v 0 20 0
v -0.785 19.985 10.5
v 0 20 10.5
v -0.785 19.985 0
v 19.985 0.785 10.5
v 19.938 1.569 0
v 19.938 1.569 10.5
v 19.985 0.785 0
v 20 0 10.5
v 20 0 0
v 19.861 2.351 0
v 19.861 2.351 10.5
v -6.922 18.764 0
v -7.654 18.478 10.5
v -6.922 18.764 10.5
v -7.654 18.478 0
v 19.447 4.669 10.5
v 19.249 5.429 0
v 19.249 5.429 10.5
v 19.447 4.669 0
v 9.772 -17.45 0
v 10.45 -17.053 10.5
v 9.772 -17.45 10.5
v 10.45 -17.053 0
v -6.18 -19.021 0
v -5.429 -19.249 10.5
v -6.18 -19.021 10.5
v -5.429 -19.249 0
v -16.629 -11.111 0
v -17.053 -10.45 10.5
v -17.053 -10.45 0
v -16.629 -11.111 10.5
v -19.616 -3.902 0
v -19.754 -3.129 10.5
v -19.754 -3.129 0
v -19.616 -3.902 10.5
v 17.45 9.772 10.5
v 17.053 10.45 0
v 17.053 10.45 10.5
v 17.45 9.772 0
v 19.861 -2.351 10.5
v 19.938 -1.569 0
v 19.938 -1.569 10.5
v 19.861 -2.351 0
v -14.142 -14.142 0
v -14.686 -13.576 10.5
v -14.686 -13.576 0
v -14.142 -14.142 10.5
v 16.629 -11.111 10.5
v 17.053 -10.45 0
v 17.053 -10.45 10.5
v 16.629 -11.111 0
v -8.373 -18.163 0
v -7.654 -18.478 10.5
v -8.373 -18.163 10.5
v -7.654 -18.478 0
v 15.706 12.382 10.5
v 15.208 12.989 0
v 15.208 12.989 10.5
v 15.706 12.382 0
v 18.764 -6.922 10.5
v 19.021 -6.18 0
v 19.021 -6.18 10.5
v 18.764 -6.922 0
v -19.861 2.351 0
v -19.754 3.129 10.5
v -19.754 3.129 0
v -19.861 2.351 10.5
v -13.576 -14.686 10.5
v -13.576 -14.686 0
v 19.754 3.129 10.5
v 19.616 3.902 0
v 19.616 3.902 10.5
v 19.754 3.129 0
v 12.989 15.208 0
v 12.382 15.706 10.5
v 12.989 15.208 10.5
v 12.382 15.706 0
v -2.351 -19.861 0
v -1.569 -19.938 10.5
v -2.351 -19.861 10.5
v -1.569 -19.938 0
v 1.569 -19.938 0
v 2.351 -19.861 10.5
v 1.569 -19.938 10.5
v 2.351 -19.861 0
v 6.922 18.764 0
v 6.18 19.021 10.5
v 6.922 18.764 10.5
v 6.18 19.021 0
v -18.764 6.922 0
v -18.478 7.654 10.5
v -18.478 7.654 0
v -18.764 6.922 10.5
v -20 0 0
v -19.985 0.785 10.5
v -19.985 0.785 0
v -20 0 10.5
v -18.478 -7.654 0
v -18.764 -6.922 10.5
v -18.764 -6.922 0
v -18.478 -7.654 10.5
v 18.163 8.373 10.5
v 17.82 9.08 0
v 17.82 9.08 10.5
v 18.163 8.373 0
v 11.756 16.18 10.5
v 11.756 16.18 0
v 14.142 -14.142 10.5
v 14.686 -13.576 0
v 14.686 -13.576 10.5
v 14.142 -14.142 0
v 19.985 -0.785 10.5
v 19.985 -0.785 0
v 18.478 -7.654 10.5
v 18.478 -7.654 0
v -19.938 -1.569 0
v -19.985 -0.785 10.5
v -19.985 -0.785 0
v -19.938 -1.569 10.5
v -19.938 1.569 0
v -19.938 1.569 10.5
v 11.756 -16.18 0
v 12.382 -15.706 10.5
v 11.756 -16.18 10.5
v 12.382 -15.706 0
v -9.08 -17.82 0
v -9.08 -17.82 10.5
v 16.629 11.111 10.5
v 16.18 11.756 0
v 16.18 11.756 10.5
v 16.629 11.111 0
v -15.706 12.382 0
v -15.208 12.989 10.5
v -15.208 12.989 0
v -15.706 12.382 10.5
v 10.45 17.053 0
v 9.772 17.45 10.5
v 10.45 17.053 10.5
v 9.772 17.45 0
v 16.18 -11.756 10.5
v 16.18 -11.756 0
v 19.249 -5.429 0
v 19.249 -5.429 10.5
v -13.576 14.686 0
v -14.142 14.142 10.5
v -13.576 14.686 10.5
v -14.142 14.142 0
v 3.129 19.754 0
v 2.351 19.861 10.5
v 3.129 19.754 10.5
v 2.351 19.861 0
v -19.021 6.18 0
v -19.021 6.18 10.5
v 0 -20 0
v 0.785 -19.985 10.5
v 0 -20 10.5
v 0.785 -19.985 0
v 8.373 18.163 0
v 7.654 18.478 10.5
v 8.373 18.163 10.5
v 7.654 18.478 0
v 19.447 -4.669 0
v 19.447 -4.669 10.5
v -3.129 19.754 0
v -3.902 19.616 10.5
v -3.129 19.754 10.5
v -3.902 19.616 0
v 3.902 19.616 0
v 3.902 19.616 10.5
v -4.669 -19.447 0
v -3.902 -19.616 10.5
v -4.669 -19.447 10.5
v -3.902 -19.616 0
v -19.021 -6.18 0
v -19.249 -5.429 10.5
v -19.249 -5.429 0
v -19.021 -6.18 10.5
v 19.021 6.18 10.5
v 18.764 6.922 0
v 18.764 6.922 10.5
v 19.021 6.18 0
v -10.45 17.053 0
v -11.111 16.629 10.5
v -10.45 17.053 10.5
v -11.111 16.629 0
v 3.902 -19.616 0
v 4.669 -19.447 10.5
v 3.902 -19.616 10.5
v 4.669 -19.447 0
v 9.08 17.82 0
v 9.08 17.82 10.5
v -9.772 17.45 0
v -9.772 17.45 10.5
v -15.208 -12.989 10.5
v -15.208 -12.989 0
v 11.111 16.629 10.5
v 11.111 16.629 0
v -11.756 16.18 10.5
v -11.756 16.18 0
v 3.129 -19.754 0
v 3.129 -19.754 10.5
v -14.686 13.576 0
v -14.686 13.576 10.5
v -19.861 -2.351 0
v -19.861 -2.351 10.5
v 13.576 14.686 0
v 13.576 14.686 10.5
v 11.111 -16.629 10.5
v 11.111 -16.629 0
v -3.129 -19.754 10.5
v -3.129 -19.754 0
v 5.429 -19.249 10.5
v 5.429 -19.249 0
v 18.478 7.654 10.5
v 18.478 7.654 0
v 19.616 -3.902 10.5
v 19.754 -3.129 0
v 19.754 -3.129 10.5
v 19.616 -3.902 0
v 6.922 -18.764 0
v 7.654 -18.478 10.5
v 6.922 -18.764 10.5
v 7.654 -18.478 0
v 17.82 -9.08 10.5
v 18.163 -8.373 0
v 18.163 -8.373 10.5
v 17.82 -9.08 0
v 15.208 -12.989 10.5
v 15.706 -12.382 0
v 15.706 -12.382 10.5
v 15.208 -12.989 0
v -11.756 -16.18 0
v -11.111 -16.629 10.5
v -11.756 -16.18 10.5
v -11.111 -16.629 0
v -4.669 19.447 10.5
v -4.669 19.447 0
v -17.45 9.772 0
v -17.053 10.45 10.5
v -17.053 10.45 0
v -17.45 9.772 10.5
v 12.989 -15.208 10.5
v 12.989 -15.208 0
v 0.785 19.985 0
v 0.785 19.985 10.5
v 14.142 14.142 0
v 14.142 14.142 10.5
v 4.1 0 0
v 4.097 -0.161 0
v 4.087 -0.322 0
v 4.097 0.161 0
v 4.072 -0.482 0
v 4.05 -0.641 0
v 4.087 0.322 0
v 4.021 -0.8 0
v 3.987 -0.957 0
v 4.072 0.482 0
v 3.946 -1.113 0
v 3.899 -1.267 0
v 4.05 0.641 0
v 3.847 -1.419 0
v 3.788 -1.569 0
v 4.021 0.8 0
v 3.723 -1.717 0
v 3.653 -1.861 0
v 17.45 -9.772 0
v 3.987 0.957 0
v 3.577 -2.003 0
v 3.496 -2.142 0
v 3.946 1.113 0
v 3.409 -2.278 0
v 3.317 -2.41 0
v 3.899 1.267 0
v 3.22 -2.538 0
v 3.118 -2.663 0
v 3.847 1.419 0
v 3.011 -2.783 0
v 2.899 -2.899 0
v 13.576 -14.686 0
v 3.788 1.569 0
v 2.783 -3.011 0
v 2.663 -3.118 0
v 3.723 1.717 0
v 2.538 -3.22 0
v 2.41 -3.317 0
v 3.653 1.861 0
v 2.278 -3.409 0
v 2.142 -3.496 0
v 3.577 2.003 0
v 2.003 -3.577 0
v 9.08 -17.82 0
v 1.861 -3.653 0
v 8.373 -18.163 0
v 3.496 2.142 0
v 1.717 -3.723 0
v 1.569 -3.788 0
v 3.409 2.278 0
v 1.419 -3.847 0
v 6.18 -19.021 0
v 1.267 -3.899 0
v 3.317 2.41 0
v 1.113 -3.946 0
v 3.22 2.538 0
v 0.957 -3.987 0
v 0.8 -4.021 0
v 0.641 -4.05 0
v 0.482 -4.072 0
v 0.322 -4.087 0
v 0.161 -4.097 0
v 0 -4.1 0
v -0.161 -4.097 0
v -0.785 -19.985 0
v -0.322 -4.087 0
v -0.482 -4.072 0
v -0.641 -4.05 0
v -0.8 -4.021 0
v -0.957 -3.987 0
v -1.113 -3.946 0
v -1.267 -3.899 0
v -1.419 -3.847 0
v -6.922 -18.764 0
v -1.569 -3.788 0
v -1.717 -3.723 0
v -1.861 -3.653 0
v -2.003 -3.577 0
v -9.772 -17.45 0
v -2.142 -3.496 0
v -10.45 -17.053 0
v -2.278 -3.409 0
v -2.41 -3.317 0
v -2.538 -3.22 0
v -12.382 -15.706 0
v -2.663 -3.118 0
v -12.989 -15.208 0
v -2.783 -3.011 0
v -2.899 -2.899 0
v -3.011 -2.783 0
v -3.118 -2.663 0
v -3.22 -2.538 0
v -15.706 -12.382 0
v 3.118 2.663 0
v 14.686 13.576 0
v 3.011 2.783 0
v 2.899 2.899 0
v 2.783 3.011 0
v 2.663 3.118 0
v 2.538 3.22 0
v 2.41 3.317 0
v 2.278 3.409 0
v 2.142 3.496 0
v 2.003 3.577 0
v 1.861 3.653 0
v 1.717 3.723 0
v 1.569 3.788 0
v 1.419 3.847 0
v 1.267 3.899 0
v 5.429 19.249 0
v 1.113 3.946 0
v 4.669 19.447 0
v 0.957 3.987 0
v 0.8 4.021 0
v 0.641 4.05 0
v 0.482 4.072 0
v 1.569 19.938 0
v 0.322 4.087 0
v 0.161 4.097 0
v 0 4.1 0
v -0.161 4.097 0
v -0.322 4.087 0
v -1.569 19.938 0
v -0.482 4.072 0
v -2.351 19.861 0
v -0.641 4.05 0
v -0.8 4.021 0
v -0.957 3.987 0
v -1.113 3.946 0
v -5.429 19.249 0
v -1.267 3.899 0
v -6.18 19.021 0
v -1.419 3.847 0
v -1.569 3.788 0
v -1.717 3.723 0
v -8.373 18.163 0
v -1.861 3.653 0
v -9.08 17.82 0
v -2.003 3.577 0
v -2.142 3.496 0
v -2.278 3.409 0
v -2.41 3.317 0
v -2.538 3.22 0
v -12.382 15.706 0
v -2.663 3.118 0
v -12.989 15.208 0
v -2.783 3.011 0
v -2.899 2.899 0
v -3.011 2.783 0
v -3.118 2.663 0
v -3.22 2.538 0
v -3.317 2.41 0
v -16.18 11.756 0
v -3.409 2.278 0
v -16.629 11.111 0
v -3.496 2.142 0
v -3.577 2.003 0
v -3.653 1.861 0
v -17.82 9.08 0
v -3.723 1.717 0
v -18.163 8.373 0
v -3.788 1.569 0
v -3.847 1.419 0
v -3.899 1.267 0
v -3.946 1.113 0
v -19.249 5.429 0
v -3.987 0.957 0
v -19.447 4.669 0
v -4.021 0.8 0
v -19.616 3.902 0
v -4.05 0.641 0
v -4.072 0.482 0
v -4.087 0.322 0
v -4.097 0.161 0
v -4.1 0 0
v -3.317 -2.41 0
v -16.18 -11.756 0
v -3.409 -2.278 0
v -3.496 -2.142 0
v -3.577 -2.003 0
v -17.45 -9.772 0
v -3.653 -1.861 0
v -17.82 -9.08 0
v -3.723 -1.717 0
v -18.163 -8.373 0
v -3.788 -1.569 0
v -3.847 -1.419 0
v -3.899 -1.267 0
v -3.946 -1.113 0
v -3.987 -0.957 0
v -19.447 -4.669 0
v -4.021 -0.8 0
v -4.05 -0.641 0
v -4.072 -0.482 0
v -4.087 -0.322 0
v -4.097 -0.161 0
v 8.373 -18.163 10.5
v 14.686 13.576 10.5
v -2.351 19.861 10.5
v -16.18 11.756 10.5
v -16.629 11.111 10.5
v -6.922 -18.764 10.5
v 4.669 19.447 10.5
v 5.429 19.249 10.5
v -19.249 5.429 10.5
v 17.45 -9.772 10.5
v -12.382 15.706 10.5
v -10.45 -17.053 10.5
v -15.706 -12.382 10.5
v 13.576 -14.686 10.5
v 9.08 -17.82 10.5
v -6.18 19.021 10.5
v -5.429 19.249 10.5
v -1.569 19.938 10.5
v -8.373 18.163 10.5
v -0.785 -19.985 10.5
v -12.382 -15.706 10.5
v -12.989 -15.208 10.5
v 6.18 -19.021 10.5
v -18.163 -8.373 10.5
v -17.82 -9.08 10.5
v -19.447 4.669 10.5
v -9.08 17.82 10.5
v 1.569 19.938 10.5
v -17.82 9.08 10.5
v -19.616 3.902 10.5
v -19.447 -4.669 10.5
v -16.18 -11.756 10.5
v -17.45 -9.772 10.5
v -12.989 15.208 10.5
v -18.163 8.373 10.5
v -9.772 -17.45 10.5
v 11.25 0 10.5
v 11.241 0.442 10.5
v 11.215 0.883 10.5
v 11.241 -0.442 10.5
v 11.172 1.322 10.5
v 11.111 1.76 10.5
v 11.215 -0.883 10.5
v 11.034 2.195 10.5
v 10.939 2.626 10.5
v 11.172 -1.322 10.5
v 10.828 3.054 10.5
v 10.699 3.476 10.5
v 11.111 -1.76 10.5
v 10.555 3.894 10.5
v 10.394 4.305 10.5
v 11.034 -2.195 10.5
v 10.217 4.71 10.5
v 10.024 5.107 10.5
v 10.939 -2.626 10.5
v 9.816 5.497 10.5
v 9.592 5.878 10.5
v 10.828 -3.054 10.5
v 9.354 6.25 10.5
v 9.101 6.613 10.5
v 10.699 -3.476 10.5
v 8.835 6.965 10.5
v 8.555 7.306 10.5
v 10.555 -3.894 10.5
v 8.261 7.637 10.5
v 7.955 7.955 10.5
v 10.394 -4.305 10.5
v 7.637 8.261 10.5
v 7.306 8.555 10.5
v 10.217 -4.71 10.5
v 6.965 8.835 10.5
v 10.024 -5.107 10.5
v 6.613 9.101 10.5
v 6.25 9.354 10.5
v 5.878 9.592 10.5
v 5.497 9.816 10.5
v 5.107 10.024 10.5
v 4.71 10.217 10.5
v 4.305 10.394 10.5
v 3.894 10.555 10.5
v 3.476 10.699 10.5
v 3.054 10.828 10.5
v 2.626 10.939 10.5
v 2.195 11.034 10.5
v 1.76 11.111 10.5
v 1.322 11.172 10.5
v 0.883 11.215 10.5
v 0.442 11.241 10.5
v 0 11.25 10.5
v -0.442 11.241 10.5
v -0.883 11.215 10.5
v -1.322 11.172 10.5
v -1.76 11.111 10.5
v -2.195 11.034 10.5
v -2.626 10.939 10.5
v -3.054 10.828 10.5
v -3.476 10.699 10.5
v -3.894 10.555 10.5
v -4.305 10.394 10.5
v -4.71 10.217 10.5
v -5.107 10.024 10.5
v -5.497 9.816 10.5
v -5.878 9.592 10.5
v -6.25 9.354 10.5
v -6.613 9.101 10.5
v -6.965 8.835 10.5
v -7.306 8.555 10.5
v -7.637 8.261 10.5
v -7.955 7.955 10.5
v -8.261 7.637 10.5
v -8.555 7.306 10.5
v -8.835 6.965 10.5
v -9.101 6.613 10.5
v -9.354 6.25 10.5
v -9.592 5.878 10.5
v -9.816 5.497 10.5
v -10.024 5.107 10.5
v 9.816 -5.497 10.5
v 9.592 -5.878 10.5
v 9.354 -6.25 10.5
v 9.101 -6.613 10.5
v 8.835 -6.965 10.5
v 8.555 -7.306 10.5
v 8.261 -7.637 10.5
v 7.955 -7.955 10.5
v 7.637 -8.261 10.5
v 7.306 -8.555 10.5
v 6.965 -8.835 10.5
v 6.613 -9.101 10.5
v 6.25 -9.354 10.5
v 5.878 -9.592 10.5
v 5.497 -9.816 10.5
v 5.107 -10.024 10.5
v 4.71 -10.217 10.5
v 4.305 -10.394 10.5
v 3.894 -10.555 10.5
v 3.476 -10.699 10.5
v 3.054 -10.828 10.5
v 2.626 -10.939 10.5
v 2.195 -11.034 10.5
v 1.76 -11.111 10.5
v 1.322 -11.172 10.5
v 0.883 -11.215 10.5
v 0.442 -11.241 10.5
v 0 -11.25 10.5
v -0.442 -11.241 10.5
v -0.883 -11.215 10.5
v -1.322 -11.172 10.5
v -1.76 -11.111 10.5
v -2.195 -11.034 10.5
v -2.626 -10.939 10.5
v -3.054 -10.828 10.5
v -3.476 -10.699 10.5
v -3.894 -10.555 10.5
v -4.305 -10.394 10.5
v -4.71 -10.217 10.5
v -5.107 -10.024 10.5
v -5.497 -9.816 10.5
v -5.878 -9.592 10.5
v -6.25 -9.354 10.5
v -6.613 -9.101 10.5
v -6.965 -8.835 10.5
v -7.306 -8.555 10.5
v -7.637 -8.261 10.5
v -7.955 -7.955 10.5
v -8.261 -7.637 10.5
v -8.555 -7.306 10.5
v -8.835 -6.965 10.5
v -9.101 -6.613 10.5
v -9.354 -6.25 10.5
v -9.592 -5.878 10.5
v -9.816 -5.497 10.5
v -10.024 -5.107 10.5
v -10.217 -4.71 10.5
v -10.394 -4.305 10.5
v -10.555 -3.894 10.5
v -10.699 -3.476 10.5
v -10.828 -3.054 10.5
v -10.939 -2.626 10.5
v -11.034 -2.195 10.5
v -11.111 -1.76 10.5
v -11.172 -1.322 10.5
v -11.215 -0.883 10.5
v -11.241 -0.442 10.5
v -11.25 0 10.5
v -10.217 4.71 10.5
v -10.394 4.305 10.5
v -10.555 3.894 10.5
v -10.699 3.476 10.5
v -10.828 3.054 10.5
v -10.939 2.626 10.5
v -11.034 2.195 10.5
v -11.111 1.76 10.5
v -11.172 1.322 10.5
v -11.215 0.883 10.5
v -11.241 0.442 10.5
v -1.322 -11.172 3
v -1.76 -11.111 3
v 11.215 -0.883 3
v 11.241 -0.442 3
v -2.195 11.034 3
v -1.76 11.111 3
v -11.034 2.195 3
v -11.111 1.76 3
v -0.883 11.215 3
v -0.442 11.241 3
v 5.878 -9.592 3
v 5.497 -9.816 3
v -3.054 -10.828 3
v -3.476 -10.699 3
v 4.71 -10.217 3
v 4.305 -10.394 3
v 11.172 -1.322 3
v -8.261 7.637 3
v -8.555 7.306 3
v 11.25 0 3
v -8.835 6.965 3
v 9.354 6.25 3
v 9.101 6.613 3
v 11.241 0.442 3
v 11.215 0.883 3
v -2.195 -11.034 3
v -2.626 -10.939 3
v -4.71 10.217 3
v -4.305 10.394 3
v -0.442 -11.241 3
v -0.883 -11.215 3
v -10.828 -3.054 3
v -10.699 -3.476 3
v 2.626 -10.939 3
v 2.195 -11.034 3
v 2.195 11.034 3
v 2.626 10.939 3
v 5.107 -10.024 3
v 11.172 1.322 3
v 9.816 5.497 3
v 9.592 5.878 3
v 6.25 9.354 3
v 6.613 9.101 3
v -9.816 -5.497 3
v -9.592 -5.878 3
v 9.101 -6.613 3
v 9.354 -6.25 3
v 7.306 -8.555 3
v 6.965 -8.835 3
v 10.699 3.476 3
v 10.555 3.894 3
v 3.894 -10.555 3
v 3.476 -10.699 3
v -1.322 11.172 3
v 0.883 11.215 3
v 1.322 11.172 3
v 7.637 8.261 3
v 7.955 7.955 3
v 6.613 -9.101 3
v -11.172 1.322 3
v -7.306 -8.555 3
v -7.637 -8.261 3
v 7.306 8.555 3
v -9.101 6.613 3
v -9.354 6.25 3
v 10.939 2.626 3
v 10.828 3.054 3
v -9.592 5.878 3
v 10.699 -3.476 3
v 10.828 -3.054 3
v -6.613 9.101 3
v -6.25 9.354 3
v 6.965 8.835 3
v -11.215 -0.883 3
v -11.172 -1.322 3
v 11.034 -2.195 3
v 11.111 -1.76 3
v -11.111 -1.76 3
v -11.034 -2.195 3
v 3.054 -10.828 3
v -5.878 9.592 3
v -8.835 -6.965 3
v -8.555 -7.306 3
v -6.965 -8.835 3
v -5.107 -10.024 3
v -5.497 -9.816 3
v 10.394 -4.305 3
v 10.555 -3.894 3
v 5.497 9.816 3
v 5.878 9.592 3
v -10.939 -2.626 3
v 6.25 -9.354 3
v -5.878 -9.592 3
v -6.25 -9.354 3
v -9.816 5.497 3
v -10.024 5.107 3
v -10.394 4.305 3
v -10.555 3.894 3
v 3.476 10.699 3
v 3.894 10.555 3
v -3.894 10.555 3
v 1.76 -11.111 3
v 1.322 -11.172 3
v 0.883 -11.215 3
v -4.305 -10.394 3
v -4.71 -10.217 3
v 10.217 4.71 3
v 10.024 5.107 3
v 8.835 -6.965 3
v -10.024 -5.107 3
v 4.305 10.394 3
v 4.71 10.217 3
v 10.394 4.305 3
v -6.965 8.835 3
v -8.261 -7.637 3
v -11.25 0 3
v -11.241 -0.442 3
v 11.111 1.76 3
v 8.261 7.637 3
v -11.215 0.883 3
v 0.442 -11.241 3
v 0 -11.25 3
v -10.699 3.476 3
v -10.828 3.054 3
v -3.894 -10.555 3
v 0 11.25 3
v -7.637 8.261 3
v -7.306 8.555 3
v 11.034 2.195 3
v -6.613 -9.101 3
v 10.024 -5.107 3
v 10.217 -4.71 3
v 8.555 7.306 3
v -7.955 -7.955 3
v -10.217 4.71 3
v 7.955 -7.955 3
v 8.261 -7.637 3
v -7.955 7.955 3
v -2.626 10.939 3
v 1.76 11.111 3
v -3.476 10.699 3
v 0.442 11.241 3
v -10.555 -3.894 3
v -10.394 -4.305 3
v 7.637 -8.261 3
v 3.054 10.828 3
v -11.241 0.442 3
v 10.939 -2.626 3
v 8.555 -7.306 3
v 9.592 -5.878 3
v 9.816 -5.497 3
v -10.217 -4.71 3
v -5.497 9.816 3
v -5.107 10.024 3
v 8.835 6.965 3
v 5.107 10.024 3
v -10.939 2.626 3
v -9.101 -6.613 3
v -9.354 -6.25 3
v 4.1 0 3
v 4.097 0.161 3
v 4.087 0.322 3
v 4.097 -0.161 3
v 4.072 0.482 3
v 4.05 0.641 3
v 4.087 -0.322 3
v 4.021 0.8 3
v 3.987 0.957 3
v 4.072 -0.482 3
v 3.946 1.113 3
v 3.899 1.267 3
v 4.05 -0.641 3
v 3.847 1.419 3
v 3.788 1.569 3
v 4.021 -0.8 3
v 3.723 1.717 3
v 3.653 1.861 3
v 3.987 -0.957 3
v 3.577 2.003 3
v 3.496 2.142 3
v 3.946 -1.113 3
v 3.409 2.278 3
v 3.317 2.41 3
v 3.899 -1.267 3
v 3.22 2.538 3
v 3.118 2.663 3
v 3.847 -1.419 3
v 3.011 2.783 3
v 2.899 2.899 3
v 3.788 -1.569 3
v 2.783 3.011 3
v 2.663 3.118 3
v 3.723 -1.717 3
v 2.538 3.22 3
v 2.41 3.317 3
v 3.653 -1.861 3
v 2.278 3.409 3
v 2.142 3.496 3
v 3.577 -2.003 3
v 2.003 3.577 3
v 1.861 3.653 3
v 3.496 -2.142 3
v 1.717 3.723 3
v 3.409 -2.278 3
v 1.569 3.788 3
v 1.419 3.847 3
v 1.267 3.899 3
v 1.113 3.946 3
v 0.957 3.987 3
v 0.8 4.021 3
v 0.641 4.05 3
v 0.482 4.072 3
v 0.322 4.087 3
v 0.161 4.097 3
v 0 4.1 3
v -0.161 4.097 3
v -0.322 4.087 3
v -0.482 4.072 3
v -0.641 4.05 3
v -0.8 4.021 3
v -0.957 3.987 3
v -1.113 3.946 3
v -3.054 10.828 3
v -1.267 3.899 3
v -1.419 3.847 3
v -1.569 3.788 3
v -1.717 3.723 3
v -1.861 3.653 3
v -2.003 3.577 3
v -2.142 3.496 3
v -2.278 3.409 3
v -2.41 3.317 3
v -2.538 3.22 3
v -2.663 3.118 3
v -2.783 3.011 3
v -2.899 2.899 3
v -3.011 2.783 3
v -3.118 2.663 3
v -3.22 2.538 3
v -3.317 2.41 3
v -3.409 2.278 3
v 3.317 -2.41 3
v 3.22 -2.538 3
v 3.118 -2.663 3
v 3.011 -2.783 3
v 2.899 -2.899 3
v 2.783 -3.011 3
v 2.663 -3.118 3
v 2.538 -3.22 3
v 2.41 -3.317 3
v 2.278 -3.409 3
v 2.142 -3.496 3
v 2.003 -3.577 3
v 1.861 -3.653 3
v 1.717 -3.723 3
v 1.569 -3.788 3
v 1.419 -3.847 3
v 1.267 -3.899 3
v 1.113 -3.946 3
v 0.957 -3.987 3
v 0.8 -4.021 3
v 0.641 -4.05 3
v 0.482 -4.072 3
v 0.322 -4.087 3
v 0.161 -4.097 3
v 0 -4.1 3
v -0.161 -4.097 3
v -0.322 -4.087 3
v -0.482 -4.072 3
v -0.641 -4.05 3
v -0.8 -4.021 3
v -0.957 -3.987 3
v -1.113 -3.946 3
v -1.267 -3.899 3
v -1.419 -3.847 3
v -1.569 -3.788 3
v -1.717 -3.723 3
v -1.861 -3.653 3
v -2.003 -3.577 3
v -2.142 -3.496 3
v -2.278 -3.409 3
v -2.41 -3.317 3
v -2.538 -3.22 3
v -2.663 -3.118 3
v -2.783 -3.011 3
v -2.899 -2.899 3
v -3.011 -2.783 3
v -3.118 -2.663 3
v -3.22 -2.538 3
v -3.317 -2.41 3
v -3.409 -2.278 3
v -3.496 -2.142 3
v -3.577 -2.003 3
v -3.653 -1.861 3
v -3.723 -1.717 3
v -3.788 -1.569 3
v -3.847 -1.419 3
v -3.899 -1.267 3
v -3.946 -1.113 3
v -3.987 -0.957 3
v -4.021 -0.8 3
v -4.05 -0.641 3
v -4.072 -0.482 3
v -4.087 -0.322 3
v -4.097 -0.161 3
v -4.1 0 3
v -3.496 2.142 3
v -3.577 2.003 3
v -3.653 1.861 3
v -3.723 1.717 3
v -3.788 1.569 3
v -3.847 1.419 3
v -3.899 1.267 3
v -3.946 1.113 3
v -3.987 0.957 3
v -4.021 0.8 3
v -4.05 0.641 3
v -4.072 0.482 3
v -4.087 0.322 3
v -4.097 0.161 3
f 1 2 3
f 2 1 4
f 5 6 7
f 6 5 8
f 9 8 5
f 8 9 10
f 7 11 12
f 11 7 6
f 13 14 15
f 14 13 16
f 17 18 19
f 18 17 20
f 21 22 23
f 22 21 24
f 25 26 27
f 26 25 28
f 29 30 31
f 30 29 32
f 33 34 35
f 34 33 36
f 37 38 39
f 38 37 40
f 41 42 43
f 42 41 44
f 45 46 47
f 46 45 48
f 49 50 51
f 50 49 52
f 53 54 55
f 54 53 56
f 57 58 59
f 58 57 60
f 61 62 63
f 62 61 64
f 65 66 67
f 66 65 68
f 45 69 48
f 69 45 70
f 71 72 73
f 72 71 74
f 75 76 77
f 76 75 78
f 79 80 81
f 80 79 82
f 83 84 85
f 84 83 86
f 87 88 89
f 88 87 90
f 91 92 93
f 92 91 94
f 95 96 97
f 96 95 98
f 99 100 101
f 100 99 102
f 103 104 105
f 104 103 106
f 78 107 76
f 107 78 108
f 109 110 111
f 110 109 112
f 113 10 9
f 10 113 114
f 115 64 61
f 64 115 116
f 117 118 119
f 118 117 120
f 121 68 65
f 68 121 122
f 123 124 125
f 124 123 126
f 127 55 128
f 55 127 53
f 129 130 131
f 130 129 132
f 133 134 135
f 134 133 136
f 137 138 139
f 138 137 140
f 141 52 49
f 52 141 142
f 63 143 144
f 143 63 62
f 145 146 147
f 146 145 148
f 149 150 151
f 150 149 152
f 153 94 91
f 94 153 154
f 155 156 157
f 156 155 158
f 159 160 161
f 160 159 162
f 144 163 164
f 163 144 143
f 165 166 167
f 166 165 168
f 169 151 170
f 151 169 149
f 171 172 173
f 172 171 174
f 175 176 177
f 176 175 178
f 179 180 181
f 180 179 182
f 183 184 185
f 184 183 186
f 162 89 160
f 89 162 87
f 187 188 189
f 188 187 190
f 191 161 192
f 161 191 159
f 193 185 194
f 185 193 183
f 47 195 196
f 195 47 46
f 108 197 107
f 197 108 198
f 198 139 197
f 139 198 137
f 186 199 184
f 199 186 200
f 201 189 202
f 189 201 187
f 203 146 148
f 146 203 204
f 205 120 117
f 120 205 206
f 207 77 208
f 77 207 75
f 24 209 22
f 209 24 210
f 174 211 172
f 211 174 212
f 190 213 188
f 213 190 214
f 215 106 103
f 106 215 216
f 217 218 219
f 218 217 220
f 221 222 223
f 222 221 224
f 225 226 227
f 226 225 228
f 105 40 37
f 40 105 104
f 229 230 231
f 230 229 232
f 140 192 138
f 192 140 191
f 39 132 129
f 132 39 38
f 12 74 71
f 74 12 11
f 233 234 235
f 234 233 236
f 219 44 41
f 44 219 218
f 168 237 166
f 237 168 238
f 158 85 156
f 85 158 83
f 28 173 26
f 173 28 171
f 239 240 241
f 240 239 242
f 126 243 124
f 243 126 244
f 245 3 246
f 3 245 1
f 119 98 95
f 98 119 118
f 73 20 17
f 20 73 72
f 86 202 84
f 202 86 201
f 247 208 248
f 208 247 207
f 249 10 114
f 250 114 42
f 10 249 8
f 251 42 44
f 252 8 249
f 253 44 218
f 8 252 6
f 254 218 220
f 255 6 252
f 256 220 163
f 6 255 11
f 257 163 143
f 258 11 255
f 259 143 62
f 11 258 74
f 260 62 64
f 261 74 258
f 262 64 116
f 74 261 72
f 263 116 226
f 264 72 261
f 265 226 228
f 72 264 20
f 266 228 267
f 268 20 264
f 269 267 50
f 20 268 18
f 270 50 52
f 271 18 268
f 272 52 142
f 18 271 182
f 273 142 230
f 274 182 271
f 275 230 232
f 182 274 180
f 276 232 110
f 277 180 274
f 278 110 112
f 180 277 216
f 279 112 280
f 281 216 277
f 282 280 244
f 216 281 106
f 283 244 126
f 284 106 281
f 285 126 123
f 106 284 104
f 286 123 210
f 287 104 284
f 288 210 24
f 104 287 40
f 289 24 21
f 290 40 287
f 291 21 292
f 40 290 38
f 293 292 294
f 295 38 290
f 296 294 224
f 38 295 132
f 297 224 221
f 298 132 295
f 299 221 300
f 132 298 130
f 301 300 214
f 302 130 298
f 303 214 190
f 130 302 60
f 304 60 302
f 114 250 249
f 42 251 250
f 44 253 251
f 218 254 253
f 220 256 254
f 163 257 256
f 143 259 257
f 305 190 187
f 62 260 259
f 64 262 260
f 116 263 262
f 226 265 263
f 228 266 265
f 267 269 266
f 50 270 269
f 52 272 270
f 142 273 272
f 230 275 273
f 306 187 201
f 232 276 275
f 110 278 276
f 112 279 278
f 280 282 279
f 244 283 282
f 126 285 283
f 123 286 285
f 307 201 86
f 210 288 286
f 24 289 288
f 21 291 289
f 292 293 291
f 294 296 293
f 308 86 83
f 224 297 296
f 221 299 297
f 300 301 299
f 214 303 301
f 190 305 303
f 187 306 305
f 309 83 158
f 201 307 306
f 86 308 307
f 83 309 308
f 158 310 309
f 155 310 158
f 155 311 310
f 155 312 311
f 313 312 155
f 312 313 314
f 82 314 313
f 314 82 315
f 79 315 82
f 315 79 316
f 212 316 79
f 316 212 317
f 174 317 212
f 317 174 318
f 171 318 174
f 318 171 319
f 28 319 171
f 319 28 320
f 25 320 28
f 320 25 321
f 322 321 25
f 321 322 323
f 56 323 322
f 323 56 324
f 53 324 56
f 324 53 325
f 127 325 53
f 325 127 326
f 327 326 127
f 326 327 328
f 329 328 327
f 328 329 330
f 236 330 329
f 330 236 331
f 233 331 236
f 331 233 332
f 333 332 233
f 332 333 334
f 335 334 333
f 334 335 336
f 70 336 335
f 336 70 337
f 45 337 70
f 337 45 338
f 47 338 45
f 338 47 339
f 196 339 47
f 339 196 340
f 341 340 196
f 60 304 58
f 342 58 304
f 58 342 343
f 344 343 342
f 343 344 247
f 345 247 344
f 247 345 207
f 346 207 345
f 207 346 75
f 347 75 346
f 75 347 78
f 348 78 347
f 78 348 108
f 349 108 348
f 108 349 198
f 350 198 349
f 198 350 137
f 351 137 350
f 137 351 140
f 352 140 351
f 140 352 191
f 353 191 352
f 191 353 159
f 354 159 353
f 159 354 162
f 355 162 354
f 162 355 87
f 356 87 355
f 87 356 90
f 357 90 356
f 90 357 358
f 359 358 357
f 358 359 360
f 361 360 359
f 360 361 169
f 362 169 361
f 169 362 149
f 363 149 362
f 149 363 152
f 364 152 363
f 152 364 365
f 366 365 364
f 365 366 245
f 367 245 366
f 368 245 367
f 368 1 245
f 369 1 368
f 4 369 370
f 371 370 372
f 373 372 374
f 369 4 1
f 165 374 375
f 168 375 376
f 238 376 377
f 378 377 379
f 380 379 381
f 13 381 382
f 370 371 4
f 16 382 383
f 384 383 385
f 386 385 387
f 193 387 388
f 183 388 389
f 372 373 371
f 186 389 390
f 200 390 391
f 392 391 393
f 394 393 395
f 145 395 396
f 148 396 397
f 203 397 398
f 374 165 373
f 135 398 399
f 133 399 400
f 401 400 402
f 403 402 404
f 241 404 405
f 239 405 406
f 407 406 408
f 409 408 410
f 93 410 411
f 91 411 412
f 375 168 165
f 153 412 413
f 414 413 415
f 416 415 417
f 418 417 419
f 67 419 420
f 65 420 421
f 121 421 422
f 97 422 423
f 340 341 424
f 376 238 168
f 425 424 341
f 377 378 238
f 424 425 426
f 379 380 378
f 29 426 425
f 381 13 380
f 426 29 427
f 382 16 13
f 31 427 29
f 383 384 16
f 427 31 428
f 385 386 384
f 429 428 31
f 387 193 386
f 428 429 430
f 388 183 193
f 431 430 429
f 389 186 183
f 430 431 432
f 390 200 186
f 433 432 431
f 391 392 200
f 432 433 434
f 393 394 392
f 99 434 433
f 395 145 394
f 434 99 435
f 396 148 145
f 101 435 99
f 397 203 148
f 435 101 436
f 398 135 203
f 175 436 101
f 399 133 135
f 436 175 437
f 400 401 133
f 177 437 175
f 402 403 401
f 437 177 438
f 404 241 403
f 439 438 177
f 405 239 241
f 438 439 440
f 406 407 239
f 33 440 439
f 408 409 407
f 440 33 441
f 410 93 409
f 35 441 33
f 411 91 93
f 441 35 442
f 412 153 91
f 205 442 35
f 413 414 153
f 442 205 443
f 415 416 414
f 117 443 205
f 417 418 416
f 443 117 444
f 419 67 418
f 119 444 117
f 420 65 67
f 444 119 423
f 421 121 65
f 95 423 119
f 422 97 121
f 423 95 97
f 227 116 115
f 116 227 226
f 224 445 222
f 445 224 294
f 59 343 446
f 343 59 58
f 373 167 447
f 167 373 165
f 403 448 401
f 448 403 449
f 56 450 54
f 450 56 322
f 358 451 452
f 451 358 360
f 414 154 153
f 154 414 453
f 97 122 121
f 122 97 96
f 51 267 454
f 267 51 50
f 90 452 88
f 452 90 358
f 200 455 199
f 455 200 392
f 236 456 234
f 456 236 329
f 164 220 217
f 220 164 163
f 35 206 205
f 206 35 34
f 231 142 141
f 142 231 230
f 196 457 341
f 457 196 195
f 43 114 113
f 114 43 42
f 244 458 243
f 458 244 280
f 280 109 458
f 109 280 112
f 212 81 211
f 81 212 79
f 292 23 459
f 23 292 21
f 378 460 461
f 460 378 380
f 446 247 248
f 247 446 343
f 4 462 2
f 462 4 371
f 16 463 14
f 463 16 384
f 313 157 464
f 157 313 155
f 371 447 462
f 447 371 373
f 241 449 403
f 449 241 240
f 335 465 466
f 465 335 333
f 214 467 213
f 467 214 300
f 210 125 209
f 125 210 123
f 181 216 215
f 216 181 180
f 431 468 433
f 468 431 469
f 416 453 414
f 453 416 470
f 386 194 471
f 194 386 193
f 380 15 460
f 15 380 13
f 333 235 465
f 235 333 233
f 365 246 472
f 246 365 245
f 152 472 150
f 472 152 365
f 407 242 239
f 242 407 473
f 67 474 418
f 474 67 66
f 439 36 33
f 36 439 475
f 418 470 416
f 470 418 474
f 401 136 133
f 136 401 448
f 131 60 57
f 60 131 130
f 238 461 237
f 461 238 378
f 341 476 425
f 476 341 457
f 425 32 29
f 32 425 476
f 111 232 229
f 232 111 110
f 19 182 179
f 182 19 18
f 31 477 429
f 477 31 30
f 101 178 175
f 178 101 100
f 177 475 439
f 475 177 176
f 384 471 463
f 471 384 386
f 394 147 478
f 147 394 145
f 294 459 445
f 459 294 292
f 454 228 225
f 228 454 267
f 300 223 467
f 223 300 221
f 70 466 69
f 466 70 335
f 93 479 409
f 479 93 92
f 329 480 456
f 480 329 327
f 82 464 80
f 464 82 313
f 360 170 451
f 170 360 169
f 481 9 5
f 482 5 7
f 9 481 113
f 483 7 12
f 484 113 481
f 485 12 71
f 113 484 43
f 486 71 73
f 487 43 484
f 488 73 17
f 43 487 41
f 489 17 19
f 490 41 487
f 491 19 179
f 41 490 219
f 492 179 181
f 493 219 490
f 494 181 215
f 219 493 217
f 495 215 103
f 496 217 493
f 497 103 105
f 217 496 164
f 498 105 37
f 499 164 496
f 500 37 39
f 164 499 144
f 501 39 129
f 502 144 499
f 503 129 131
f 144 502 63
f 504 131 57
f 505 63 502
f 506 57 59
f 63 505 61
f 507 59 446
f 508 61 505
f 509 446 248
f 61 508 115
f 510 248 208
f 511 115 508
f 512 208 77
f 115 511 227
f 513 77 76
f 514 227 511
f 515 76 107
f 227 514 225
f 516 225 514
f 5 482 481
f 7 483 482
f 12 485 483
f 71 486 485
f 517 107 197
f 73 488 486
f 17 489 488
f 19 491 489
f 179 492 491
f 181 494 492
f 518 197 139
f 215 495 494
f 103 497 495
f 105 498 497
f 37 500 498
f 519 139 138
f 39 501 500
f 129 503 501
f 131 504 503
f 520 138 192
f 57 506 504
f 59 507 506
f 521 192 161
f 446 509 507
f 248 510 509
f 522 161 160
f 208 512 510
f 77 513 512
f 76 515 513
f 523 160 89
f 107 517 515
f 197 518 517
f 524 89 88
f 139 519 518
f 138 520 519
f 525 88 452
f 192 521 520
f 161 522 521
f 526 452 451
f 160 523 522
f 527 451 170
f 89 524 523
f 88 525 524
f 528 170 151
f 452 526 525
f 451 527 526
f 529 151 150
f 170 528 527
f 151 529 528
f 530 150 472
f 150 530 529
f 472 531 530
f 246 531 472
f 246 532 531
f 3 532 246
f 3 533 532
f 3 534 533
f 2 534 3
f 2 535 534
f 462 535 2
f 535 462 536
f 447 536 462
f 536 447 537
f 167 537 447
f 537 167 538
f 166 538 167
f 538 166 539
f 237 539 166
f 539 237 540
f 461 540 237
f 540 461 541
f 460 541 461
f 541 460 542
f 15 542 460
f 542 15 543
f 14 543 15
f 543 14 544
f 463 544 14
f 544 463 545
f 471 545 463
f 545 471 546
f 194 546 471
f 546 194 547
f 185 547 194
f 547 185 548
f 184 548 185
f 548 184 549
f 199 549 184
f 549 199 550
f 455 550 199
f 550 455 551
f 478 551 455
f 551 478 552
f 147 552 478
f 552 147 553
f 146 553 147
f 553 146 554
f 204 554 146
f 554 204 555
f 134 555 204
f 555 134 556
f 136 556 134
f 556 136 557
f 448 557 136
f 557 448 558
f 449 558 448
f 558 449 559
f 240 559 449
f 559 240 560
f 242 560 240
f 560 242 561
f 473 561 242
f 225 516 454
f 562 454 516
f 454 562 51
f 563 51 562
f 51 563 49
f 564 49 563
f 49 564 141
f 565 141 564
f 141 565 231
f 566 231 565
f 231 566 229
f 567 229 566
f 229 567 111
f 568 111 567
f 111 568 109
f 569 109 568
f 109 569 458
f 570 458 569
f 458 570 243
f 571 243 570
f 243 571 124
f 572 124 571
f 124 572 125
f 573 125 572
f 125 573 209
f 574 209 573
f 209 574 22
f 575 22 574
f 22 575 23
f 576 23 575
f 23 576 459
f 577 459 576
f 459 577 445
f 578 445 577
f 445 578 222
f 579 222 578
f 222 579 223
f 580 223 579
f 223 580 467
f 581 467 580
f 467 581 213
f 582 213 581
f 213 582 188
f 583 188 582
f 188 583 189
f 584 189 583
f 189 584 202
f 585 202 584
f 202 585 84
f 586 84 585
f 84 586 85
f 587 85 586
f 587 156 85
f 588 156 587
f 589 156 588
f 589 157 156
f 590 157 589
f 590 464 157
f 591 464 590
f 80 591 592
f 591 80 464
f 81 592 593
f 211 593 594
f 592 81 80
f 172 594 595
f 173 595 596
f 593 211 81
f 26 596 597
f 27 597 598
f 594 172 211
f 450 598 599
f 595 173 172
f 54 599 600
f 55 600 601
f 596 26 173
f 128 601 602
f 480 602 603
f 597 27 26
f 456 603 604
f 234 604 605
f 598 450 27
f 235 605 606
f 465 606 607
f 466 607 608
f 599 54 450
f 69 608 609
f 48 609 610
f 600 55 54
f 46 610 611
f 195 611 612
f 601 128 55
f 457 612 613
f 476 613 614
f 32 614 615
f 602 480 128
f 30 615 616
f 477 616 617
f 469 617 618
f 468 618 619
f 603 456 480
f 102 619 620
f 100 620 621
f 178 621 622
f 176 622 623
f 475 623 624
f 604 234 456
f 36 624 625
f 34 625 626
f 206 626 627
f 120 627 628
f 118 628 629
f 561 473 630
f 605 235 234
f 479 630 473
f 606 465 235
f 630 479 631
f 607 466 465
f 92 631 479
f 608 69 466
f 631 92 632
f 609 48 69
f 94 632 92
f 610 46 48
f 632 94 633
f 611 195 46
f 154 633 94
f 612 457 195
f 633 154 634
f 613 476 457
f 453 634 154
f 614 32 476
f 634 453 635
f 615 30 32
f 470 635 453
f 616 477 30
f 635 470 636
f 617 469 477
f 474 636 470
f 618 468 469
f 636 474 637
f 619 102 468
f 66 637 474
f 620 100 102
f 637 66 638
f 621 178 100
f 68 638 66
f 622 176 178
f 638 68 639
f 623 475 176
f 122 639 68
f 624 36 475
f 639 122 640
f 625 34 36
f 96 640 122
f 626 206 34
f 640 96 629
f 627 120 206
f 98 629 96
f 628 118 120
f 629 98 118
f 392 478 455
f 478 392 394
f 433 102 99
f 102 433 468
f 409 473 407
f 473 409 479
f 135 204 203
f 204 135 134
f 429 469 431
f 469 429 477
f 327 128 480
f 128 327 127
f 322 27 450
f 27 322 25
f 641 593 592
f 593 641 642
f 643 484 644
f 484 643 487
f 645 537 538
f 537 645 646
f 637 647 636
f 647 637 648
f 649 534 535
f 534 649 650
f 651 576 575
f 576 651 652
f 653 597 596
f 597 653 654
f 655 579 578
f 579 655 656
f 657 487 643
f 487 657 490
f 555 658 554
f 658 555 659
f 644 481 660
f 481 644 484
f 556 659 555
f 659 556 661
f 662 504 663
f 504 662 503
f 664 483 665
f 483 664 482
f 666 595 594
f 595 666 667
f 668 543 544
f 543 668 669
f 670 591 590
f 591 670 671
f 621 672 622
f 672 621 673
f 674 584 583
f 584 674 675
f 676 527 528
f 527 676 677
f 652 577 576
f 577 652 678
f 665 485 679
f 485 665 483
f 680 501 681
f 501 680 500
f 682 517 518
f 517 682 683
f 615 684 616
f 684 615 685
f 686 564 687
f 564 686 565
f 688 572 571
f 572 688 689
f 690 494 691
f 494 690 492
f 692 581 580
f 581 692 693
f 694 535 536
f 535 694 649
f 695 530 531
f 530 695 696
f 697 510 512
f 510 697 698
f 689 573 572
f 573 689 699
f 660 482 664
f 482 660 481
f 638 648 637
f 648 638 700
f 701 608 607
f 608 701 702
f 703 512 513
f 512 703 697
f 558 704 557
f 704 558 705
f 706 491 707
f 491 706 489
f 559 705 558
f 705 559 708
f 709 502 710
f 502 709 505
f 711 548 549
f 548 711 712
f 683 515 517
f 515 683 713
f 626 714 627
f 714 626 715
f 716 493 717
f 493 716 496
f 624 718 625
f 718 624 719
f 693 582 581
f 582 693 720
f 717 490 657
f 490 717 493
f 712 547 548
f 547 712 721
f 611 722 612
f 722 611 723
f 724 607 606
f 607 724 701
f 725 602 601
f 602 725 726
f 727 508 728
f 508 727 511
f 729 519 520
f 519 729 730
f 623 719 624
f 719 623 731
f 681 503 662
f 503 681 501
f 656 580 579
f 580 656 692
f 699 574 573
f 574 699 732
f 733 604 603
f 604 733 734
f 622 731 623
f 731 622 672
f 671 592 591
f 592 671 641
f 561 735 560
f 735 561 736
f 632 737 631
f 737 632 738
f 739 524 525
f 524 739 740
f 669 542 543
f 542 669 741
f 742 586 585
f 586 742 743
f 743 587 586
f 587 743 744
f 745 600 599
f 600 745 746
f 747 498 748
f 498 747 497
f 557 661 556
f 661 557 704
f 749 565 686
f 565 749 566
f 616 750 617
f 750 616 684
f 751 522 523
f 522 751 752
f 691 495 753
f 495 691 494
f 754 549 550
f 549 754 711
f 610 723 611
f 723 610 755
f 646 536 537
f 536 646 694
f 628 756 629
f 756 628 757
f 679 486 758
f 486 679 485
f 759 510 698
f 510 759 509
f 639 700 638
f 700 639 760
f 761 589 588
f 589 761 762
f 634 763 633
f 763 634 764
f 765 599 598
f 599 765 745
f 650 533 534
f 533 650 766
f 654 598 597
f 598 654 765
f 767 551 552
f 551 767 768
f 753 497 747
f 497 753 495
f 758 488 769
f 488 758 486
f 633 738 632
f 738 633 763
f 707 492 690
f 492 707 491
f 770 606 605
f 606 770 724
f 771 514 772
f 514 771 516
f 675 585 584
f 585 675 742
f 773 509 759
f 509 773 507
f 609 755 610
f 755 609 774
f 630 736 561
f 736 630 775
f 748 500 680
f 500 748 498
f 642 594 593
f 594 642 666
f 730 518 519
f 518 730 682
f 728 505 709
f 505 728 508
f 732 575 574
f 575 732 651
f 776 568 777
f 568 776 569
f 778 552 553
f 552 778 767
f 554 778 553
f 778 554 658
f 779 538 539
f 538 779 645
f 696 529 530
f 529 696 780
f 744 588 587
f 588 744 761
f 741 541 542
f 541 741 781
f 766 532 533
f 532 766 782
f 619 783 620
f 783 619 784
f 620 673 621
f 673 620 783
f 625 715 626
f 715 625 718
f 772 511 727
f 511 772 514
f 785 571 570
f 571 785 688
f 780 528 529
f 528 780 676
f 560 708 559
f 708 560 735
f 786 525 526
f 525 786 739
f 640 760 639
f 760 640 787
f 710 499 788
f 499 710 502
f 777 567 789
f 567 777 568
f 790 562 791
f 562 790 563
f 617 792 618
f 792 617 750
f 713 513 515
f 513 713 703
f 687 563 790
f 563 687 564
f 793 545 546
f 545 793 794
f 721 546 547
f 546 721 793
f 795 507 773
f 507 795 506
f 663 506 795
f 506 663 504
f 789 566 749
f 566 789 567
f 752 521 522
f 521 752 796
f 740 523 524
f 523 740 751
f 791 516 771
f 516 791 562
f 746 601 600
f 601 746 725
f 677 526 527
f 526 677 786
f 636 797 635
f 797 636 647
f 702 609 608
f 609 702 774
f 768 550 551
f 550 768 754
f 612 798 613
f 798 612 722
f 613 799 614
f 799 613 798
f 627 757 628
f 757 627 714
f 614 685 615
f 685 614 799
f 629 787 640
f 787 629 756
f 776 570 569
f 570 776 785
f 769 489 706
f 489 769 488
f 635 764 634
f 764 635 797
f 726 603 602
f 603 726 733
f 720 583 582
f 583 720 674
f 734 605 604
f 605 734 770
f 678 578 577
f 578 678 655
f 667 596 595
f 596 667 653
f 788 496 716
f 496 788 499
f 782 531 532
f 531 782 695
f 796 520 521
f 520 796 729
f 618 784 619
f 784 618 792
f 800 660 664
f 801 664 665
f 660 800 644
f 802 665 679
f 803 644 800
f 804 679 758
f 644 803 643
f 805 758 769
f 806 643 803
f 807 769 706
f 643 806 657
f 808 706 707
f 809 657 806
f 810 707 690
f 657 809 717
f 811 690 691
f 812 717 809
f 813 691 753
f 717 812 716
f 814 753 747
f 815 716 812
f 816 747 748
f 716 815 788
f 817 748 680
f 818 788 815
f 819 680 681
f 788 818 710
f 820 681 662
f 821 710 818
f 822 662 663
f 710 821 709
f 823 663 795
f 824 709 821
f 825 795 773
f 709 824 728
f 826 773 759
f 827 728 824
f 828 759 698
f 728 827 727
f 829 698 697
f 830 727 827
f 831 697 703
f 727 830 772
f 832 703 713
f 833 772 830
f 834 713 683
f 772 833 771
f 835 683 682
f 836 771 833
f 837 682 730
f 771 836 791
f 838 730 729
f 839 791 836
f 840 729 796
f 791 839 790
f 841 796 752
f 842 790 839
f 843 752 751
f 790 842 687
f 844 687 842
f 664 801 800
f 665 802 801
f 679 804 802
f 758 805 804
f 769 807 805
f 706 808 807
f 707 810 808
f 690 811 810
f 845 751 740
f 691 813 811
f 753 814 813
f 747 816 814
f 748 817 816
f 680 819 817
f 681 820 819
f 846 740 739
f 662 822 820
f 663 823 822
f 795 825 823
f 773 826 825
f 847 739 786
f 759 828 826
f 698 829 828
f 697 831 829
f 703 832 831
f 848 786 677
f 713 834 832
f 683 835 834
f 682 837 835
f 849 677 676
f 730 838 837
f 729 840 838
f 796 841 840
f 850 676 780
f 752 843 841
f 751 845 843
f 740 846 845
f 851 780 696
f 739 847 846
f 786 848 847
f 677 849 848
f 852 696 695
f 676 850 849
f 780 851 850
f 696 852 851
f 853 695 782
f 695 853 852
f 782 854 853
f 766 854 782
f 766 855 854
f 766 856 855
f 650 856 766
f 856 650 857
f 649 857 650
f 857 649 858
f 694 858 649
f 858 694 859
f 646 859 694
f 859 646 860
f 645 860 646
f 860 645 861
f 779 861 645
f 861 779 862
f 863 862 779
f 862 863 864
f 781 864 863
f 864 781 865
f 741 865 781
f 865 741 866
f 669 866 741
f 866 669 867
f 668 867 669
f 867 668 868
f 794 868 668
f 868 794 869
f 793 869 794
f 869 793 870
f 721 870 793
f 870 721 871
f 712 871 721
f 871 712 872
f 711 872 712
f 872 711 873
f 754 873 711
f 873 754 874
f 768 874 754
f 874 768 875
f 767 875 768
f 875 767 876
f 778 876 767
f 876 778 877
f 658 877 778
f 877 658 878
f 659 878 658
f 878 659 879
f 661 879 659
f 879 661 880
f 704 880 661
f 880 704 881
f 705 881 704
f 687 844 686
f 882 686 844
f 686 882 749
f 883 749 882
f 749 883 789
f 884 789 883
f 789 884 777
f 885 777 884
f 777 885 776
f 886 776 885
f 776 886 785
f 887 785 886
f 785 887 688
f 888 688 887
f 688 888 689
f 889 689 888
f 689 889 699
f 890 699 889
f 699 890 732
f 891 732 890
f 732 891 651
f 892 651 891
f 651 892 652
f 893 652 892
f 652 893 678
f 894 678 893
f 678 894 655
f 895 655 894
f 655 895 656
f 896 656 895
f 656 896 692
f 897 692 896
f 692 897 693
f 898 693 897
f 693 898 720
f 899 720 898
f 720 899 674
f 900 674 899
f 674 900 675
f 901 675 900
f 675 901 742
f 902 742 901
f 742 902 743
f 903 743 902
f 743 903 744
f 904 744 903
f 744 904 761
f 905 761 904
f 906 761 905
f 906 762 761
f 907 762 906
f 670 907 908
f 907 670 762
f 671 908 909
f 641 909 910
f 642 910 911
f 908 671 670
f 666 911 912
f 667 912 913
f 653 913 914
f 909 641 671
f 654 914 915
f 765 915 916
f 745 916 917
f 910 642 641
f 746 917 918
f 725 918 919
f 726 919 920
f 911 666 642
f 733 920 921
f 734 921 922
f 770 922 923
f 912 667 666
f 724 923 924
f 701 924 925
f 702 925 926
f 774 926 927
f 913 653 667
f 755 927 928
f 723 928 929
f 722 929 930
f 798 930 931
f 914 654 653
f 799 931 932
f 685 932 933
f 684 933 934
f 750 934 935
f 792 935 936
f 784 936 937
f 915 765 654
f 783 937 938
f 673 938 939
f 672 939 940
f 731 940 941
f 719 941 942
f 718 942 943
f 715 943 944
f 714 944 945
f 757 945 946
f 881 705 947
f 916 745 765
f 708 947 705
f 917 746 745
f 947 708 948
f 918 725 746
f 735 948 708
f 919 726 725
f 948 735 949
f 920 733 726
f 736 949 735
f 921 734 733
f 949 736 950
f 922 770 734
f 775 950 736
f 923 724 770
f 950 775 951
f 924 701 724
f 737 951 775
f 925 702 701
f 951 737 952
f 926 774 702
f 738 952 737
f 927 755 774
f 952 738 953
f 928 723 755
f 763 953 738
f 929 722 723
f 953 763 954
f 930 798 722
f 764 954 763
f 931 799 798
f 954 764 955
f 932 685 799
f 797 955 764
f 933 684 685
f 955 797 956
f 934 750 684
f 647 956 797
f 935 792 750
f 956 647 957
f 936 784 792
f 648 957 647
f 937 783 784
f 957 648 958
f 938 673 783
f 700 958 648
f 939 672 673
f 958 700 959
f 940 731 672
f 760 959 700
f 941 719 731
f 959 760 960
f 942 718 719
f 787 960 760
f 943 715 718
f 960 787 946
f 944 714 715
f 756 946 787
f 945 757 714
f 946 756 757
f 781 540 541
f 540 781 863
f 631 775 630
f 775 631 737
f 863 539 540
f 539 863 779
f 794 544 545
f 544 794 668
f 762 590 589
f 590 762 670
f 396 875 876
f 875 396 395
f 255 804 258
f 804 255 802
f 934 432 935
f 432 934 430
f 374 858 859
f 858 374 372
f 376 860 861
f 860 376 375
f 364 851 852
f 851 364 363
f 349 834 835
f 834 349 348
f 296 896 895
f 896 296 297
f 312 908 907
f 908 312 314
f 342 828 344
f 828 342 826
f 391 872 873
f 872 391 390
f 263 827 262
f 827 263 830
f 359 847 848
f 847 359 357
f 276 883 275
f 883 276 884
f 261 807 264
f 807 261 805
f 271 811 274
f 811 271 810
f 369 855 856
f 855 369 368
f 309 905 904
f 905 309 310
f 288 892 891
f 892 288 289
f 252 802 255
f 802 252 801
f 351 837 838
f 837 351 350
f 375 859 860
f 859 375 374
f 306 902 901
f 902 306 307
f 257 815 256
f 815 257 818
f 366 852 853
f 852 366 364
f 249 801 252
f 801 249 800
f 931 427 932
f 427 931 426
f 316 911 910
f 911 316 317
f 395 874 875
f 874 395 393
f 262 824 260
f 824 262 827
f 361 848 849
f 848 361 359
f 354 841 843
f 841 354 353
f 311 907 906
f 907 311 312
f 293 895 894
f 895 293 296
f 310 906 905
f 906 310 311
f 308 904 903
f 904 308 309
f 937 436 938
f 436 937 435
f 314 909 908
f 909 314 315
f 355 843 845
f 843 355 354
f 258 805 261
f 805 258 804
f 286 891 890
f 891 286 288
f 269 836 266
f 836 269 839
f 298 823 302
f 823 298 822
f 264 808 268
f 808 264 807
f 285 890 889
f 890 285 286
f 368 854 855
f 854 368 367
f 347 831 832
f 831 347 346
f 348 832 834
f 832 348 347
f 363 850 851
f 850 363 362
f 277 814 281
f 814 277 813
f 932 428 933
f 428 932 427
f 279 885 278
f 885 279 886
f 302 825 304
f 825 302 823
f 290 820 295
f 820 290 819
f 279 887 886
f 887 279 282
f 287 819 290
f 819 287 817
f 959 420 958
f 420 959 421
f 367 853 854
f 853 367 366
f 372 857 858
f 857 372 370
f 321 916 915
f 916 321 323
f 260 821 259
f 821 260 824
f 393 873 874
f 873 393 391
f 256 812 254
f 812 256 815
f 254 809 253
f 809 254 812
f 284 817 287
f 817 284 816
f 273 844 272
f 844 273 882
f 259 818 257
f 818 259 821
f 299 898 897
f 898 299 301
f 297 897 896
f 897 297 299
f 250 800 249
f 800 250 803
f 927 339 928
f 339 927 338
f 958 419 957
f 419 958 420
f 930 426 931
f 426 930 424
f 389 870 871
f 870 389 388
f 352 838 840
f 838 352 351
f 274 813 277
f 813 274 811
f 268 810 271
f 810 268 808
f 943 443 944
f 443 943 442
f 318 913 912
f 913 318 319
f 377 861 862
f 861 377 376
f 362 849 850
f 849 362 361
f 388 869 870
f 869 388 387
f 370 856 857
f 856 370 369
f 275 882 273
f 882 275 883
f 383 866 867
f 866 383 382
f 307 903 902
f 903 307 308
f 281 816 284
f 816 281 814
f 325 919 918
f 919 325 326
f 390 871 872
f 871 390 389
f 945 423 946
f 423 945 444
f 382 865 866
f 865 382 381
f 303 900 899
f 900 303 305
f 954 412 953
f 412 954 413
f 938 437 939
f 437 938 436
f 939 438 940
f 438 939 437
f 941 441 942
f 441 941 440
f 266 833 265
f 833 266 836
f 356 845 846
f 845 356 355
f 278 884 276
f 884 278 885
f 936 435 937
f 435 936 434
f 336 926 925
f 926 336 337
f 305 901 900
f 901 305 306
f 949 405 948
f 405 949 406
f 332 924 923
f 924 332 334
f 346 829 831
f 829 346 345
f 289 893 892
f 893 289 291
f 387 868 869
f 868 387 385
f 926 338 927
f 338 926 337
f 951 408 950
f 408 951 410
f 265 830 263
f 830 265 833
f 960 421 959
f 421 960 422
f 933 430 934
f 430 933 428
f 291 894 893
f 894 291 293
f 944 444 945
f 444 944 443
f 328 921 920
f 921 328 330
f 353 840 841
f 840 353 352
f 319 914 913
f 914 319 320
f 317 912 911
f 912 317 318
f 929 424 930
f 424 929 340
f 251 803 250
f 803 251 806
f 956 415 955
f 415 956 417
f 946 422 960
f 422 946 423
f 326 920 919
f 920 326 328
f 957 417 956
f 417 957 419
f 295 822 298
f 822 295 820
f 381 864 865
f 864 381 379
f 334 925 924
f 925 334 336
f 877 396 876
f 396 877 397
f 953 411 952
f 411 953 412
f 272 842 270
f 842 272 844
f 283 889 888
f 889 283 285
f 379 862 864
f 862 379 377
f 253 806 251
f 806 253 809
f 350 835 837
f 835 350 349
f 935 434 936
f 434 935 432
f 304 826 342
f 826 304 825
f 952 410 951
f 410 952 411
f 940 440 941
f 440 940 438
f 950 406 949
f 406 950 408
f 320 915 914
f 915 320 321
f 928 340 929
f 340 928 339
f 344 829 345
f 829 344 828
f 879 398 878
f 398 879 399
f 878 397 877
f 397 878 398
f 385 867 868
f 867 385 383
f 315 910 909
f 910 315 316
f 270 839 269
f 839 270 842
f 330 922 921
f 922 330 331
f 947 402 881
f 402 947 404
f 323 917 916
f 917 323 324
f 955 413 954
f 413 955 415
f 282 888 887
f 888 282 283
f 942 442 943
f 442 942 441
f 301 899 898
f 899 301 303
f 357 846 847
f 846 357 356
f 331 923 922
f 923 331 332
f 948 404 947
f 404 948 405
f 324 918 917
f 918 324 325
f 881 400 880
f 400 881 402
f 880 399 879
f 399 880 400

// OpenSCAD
// axle_test.scad — Pieza mínima para verificar ajuste del 608ZZ
$fn=160;

// --- Parameters ---
bearing = 22.5;     // mm, diámetro bolsillo (22mm + 0.5mm tolerancia)
bearing_depth = 7.5;// mm, profundidad bolsillo
eje = 8.2;          // mm, agujero varilla M8
wall = 3;           // mm, pared bajo el rodamiento
alto = bearing_depth + wall;

difference() {
  cylinder(h=alto, d=40);
  translate([0, 0, wall])
    cylinder(h=bearing_depth, d=bearing);
  translate([0, 0, -1])
    cylinder(h=alto + 2, d=eje);
}
